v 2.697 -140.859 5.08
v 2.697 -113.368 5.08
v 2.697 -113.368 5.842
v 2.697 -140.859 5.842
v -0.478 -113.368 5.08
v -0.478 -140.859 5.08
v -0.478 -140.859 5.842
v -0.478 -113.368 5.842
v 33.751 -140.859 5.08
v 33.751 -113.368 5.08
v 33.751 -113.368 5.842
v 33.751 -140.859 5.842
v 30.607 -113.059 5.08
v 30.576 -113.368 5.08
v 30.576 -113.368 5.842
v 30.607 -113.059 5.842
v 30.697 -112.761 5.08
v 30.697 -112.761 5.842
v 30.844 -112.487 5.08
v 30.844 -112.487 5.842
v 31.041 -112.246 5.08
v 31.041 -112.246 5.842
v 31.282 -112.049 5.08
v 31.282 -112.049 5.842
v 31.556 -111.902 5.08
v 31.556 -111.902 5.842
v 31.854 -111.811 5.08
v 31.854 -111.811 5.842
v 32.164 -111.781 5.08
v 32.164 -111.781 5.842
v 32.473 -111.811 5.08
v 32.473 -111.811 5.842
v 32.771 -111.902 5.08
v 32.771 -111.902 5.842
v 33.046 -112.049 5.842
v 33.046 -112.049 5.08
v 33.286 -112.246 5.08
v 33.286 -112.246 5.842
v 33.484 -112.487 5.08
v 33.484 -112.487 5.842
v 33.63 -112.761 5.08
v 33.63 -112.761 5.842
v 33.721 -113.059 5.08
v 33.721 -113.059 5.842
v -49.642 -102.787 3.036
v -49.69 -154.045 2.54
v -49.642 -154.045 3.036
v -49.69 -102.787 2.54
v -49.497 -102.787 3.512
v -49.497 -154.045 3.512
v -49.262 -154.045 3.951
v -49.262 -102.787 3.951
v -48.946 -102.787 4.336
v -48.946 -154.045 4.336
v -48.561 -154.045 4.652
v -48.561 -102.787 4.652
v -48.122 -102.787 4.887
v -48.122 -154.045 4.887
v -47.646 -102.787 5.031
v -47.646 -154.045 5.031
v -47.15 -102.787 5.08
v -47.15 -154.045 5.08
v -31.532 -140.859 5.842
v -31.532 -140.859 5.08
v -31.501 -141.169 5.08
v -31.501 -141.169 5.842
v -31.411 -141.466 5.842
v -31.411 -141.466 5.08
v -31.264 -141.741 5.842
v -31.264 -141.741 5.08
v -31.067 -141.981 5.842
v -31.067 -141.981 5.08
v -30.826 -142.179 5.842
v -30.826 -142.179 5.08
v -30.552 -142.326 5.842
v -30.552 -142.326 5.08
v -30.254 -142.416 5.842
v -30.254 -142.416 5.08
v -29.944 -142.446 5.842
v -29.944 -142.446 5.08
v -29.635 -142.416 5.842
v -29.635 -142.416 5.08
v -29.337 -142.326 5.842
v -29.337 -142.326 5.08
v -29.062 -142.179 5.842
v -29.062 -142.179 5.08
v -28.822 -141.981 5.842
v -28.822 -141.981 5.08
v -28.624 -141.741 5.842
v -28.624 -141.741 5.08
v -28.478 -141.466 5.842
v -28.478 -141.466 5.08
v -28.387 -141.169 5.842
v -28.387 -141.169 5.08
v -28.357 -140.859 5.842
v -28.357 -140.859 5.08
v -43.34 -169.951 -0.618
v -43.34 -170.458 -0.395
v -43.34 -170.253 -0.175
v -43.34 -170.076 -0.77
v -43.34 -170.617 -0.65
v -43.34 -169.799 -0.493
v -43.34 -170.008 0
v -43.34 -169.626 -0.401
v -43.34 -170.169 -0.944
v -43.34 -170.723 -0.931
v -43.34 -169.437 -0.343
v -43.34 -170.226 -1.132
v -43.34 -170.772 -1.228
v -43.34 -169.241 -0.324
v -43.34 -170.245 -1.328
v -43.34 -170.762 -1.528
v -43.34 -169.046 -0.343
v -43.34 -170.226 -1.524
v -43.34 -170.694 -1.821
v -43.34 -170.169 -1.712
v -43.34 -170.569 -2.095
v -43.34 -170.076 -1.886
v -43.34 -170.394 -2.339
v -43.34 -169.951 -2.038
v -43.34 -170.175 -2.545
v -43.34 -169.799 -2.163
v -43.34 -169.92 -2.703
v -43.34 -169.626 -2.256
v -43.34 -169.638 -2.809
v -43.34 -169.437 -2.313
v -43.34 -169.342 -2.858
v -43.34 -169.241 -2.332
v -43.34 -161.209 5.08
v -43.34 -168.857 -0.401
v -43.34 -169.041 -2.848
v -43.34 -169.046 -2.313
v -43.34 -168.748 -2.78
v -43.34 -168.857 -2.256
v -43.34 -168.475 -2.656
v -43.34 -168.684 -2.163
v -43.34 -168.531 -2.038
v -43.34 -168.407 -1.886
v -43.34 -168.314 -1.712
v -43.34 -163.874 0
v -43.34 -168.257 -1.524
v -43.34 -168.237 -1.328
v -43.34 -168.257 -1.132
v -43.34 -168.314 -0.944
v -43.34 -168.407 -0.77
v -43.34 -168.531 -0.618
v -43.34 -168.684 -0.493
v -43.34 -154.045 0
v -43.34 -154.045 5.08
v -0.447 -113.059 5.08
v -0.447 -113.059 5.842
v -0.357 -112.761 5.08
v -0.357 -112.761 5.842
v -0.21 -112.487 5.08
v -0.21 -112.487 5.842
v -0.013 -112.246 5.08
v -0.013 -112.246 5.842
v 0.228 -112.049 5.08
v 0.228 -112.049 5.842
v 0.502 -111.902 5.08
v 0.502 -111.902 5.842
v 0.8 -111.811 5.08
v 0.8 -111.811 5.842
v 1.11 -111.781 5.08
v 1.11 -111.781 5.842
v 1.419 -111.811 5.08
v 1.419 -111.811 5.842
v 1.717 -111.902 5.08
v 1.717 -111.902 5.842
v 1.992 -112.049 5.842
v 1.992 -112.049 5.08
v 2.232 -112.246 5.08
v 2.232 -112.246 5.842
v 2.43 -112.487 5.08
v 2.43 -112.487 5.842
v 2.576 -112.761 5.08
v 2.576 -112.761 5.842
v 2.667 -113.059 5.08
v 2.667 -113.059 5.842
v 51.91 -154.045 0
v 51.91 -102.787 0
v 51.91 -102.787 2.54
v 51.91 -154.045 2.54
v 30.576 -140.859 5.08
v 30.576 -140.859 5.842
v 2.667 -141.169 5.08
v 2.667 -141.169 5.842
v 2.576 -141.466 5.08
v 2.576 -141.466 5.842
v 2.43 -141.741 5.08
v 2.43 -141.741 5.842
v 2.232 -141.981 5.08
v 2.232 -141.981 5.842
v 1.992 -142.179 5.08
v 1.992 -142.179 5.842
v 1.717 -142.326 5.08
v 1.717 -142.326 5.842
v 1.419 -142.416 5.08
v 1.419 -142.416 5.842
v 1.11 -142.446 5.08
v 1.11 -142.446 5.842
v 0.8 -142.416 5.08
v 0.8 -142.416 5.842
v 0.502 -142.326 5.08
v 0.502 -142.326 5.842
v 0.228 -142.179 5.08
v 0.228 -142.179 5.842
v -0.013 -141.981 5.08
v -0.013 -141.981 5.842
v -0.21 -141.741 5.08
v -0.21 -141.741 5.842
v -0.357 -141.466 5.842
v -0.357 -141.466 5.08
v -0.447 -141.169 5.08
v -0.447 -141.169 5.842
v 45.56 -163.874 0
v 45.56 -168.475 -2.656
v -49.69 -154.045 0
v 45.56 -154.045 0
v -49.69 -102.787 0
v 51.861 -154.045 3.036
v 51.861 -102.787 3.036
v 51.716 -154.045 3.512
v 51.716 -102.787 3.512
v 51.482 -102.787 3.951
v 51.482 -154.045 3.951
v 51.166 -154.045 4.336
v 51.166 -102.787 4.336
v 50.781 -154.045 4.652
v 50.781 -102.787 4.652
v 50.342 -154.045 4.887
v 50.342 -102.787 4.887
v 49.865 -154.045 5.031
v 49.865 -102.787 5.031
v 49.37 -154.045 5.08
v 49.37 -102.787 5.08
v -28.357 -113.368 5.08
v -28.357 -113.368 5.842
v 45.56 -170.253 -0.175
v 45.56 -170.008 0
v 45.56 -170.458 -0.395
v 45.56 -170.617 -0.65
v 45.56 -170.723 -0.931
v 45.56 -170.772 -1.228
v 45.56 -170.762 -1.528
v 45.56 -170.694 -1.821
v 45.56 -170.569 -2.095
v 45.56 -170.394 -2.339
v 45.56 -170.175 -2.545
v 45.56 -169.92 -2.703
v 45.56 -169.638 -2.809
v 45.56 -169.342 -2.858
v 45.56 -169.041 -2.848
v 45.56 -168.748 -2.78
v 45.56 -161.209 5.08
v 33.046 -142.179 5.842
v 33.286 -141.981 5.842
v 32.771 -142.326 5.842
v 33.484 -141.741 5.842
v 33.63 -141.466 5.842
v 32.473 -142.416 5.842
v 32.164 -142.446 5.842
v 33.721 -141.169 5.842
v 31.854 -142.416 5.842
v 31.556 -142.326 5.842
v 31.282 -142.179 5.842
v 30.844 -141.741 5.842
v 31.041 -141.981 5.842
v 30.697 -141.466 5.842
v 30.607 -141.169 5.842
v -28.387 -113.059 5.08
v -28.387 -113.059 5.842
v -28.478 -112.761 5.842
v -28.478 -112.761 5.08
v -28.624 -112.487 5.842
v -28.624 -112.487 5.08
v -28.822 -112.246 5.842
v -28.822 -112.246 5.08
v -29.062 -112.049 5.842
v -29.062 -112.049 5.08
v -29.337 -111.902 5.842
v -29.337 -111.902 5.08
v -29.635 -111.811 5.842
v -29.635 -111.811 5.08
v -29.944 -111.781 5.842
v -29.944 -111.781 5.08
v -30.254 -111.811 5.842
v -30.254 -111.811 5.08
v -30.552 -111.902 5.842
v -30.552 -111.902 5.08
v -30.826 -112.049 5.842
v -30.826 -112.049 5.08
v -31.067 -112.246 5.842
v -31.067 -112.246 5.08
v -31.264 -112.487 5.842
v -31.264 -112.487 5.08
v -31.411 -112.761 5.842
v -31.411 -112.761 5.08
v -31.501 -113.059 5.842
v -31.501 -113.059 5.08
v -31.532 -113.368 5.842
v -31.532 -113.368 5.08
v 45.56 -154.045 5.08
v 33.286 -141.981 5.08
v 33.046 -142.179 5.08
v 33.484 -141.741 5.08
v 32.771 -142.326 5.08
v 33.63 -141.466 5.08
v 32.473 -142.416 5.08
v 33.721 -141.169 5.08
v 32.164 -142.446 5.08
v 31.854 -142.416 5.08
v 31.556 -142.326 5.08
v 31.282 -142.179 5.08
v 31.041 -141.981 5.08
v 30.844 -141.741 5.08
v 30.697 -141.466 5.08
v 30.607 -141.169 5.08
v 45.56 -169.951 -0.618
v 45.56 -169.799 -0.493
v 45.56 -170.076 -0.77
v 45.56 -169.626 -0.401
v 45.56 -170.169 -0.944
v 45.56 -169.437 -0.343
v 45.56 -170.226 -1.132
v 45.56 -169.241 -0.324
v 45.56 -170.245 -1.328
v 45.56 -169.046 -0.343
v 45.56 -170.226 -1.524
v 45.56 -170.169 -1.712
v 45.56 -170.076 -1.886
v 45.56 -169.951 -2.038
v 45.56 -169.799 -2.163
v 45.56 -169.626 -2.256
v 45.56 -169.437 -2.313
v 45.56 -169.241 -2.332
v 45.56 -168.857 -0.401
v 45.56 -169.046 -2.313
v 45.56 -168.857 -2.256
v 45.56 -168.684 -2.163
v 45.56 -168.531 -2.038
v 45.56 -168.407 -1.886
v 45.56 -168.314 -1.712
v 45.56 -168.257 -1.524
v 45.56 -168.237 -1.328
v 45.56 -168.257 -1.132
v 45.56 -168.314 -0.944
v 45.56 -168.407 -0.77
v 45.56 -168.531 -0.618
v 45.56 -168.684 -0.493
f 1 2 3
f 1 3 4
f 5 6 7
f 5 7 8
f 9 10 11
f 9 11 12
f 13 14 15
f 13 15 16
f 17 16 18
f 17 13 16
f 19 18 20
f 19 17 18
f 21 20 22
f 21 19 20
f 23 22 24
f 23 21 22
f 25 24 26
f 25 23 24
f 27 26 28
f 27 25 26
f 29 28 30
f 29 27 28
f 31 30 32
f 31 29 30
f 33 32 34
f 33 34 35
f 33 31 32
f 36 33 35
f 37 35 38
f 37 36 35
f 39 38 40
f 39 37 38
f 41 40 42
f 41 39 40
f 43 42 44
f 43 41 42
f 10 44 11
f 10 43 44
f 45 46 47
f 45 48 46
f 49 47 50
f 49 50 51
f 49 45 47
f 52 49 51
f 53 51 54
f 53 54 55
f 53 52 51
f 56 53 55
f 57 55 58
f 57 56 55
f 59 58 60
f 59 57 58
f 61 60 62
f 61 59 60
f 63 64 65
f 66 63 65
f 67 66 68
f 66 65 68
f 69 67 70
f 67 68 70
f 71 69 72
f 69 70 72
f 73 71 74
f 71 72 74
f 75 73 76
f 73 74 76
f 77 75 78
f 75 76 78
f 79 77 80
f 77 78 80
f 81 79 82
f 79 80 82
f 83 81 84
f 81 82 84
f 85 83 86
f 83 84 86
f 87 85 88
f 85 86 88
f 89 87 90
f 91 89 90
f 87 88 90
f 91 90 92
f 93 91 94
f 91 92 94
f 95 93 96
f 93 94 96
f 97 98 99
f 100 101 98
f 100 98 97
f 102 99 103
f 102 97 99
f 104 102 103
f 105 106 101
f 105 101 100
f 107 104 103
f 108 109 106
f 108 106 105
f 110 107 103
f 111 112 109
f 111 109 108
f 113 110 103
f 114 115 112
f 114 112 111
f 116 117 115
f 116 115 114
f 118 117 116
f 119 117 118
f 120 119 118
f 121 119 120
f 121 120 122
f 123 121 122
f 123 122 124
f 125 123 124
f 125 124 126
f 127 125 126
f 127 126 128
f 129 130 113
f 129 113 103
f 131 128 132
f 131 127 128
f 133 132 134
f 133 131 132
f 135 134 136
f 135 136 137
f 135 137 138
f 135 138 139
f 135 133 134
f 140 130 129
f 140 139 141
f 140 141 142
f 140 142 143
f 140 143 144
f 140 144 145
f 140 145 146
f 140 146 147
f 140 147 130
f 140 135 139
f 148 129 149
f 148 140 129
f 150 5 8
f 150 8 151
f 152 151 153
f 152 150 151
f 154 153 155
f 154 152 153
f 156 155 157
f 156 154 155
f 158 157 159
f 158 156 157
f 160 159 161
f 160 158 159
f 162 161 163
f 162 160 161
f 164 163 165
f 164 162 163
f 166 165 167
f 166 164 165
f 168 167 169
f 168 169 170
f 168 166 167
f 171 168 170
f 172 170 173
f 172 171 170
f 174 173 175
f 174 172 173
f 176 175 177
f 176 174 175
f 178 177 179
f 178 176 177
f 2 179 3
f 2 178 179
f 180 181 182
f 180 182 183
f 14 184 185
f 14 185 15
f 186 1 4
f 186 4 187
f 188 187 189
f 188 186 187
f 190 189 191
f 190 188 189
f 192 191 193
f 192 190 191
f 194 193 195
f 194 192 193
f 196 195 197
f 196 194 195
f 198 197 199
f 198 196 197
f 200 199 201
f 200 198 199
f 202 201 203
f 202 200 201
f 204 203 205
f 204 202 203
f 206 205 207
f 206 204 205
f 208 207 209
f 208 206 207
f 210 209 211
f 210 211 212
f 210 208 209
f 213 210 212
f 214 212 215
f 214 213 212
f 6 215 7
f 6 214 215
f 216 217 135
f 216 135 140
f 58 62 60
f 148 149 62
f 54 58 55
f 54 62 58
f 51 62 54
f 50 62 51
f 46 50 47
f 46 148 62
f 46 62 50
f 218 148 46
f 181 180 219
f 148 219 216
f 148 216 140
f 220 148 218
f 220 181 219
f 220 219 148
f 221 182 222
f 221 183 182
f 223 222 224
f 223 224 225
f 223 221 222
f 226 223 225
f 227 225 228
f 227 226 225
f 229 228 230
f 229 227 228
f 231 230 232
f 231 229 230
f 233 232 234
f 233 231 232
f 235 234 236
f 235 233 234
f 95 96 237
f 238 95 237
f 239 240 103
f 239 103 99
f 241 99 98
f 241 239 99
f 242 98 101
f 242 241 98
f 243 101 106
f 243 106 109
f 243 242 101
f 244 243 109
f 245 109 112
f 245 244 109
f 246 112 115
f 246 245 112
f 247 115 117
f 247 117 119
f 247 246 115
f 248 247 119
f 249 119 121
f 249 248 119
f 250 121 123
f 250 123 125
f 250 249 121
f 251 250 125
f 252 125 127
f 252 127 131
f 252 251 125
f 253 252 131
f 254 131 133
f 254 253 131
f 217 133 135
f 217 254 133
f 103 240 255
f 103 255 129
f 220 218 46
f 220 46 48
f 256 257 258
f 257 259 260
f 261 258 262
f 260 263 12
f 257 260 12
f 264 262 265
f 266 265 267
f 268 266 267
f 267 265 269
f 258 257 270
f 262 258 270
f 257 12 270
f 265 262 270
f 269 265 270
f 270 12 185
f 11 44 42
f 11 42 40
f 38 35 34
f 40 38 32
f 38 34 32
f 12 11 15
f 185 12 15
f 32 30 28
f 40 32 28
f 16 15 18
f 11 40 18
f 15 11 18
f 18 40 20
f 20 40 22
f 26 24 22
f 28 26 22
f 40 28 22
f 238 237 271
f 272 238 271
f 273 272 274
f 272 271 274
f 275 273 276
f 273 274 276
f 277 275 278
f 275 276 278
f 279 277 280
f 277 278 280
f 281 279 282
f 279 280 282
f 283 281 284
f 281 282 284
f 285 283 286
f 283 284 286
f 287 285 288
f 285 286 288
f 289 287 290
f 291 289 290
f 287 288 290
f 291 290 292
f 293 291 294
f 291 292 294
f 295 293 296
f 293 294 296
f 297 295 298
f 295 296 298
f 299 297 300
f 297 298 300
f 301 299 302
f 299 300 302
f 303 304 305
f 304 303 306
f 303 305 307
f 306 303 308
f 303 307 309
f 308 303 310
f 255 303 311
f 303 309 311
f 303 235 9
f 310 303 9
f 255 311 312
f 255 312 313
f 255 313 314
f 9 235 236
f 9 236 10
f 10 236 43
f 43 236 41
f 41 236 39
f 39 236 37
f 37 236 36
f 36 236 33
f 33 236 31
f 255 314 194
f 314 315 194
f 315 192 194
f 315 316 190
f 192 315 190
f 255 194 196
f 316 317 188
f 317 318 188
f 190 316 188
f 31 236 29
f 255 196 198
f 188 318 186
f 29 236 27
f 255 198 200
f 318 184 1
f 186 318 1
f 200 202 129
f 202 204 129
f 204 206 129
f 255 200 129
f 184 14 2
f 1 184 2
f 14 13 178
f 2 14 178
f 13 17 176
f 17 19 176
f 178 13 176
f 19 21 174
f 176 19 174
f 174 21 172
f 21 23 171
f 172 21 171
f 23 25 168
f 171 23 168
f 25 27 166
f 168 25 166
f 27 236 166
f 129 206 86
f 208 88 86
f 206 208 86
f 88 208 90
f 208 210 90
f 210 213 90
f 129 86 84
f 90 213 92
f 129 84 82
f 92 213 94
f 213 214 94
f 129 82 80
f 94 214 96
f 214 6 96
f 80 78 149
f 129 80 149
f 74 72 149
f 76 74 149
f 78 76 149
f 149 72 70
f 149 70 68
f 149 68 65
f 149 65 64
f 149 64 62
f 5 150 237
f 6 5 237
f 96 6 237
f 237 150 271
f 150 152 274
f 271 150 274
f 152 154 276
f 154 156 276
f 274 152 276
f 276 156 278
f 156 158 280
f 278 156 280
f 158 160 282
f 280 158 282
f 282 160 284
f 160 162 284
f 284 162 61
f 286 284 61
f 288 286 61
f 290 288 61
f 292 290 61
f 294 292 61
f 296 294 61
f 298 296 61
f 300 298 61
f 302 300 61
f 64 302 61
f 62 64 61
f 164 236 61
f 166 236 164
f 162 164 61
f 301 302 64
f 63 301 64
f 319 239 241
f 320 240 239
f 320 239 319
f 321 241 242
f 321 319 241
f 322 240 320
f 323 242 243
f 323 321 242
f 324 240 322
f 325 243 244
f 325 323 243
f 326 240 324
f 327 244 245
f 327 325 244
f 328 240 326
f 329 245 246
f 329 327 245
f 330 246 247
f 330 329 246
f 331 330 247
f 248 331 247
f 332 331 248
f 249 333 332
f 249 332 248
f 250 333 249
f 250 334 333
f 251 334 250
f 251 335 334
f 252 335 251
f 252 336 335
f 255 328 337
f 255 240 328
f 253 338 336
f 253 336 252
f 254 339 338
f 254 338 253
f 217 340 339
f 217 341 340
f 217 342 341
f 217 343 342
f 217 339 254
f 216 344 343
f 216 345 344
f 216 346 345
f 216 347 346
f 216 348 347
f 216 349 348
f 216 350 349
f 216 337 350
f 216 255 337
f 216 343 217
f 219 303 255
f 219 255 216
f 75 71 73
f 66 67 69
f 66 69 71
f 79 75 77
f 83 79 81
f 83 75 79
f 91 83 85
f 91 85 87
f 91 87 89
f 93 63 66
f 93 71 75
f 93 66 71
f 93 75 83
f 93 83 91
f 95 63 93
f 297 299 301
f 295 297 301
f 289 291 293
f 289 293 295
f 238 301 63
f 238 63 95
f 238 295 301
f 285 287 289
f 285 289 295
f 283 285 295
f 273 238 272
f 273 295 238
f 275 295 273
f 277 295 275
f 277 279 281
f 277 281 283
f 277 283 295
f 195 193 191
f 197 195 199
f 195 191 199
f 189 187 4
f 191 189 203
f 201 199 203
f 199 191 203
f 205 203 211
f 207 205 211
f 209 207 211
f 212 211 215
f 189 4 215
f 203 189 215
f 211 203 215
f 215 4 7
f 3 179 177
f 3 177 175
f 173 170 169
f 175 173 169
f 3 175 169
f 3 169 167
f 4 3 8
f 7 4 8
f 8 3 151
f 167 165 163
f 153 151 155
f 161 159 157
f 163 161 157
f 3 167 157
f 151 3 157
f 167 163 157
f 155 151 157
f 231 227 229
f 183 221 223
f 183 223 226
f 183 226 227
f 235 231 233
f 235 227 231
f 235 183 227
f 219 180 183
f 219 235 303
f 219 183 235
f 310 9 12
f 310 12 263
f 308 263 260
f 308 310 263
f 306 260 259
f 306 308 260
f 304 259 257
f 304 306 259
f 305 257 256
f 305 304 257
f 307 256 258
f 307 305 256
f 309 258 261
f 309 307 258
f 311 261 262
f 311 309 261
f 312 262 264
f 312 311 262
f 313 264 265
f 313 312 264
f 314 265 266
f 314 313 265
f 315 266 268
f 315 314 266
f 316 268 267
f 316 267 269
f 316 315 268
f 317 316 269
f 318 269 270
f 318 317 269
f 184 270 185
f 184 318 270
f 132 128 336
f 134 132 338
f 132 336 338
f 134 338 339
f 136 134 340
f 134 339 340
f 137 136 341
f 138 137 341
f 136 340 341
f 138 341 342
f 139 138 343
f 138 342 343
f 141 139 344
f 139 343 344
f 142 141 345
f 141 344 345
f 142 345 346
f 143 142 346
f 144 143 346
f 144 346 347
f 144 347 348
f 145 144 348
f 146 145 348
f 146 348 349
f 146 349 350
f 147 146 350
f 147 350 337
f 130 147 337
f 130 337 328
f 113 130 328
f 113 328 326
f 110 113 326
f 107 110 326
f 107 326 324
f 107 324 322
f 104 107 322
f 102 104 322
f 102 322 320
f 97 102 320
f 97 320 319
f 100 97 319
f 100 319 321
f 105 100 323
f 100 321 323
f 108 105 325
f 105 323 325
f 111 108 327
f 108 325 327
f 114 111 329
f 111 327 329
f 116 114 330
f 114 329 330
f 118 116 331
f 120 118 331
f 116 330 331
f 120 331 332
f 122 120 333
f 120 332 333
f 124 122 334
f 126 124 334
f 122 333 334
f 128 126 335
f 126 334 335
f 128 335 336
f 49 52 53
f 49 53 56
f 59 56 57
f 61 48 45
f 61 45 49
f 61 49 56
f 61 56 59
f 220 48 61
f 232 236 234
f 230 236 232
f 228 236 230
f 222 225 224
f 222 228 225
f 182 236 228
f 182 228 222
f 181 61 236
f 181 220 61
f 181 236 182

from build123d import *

# Parameters (mm, degrees)
EXTRUDE1_DEPTH = 5.08
FILLET1_R      = 2.54
CHAMFER1_SIZE2 = 5.08
CHAMFER1_SIZE  = 8.798818102
EXTRUDE3_DEPTH = 88.9
SKETCH2_R      = 1.003990475
EXTRUDE2_DEPTH = 196.607873206
EXTRUDE4_DEPTH = 0.762


with BuildPart() as part:
    # Sketch1 → Extrude1 (new body)
    with BuildSketch(Plane.XY):
        Polygon((-49.690313901, -102.787097767), (51.909686099, -102.787097767), (51.909686099, -154.045409896), (45.559686099, -154.045409896), (45.559686099, -170.008151162), (-43.340313901, -170.008151162), (-43.340313901, -154.045409896), (-49.690313901, -154.045409896), align=None)
    extrude(amount=EXTRUDE1_DEPTH)

    # Fillet1
    fillet1_edges = [part.edges().sort_by_distance(p)[0] for p in [
        (51.909686099, -128.416253832, 5.08),
        (-49.690313901, -128.416253832, 5.08),
    ]]
    fillet(fillet1_edges, radius=FILLET1_R)

    # Chamfer1
    chamfer1_edges = [part.edges().sort_by_distance(p)[0] for p in [
        (1.109686099, -170.008151162, 5.08),
    ]]
    chamfer1_side = [part.faces().sort_by_distance(p)[0] for p in [
        (1.109686099, -169.906551162, 5.08),
    ]]
    chamfer(chamfer1_edges, length=CHAMFER1_SIZE - 0.0001, length2=CHAMFER1_SIZE2 - 0.0001, reference=chamfer1_side[0])  # a hair under: the kernel refuses the full size

    # Sketch3 → Extrude3 (add)
    with BuildSketch(Plane(origin=(45.559686099, 0, 0), x_dir=(0, 0, -1), z_dir=(1, 0, 0))):
        with BuildLine():
            Line((-2.656143456, -165.407575745), (0, -170.008151162))
            ThreePointArc((0, -170.008151162), (2.094834297, -170.56946032), (2.656143456, -168.474626023))
            Line((2.656143456, -168.474626023), (0, -163.874050605))
            Line((0, -163.874050605), (-2.656143456, -165.407575745))
        make_face()
    extrude(amount=-EXTRUDE3_DEPTH)

    # Sketch2 → Extrude2 (cut, through all)
    with BuildSketch(Plane(origin=(45.559686099, 0, 0), x_dir=(0, 0, -1), z_dir=(1, 0, 0))):
        with Locations((1.328071728, -169.241388592)):
            Circle(SKETCH2_R)
    extrude(amount=-EXTRUDE2_DEPTH, mode=Mode.SUBTRACT)

    # Sketch4 → Extrude4 (add)
    with BuildSketch(Plane.XY.offset(5.08)):
        with BuildLine():
            Line((2.697186099, -113.368491021), (2.697186099, -140.858908158))
            ThreePointArc((2.697186099, -140.858908158), (1.109686099, -142.446408158), (-0.477813901, -140.858908158))
            Line((-0.477813901, -140.858908158), (-0.477813901, -113.368491021))
            ThreePointArc((-0.477813901, -113.368491021), (1.109686099, -111.780991021), (2.697186099, -113.368491021))
        make_face()
        with BuildLine():
            Line((-31.531803629, -113.368491021), (-31.531803629, -140.858908158))
            ThreePointArc((-31.531803629, -140.858908158), (-29.944303629, -142.446408158), (-28.356803629, -140.858908158))
            Line((-28.356803629, -140.858908158), (-28.356803629, -113.368491021))
            ThreePointArc((-28.356803629, -113.368491021), (-29.944303629, -111.780991021), (-31.531803629, -113.368491021))
        make_face()
        with BuildLine():
            Line((33.751175827, -113.368491021), (33.751175827, -140.858908158))
            ThreePointArc((33.751175827, -140.858908158), (32.163675827, -142.446408158), (30.576175827, -140.858908158))
            Line((30.576175827, -140.858908158), (30.576175827, -113.368491021))
            ThreePointArc((30.576175827, -113.368491021), (32.163675827, -111.780991021), (33.751175827, -113.368491021))
        make_face()
    extrude(amount=EXTRUDE4_DEPTH)


solid = part.part
